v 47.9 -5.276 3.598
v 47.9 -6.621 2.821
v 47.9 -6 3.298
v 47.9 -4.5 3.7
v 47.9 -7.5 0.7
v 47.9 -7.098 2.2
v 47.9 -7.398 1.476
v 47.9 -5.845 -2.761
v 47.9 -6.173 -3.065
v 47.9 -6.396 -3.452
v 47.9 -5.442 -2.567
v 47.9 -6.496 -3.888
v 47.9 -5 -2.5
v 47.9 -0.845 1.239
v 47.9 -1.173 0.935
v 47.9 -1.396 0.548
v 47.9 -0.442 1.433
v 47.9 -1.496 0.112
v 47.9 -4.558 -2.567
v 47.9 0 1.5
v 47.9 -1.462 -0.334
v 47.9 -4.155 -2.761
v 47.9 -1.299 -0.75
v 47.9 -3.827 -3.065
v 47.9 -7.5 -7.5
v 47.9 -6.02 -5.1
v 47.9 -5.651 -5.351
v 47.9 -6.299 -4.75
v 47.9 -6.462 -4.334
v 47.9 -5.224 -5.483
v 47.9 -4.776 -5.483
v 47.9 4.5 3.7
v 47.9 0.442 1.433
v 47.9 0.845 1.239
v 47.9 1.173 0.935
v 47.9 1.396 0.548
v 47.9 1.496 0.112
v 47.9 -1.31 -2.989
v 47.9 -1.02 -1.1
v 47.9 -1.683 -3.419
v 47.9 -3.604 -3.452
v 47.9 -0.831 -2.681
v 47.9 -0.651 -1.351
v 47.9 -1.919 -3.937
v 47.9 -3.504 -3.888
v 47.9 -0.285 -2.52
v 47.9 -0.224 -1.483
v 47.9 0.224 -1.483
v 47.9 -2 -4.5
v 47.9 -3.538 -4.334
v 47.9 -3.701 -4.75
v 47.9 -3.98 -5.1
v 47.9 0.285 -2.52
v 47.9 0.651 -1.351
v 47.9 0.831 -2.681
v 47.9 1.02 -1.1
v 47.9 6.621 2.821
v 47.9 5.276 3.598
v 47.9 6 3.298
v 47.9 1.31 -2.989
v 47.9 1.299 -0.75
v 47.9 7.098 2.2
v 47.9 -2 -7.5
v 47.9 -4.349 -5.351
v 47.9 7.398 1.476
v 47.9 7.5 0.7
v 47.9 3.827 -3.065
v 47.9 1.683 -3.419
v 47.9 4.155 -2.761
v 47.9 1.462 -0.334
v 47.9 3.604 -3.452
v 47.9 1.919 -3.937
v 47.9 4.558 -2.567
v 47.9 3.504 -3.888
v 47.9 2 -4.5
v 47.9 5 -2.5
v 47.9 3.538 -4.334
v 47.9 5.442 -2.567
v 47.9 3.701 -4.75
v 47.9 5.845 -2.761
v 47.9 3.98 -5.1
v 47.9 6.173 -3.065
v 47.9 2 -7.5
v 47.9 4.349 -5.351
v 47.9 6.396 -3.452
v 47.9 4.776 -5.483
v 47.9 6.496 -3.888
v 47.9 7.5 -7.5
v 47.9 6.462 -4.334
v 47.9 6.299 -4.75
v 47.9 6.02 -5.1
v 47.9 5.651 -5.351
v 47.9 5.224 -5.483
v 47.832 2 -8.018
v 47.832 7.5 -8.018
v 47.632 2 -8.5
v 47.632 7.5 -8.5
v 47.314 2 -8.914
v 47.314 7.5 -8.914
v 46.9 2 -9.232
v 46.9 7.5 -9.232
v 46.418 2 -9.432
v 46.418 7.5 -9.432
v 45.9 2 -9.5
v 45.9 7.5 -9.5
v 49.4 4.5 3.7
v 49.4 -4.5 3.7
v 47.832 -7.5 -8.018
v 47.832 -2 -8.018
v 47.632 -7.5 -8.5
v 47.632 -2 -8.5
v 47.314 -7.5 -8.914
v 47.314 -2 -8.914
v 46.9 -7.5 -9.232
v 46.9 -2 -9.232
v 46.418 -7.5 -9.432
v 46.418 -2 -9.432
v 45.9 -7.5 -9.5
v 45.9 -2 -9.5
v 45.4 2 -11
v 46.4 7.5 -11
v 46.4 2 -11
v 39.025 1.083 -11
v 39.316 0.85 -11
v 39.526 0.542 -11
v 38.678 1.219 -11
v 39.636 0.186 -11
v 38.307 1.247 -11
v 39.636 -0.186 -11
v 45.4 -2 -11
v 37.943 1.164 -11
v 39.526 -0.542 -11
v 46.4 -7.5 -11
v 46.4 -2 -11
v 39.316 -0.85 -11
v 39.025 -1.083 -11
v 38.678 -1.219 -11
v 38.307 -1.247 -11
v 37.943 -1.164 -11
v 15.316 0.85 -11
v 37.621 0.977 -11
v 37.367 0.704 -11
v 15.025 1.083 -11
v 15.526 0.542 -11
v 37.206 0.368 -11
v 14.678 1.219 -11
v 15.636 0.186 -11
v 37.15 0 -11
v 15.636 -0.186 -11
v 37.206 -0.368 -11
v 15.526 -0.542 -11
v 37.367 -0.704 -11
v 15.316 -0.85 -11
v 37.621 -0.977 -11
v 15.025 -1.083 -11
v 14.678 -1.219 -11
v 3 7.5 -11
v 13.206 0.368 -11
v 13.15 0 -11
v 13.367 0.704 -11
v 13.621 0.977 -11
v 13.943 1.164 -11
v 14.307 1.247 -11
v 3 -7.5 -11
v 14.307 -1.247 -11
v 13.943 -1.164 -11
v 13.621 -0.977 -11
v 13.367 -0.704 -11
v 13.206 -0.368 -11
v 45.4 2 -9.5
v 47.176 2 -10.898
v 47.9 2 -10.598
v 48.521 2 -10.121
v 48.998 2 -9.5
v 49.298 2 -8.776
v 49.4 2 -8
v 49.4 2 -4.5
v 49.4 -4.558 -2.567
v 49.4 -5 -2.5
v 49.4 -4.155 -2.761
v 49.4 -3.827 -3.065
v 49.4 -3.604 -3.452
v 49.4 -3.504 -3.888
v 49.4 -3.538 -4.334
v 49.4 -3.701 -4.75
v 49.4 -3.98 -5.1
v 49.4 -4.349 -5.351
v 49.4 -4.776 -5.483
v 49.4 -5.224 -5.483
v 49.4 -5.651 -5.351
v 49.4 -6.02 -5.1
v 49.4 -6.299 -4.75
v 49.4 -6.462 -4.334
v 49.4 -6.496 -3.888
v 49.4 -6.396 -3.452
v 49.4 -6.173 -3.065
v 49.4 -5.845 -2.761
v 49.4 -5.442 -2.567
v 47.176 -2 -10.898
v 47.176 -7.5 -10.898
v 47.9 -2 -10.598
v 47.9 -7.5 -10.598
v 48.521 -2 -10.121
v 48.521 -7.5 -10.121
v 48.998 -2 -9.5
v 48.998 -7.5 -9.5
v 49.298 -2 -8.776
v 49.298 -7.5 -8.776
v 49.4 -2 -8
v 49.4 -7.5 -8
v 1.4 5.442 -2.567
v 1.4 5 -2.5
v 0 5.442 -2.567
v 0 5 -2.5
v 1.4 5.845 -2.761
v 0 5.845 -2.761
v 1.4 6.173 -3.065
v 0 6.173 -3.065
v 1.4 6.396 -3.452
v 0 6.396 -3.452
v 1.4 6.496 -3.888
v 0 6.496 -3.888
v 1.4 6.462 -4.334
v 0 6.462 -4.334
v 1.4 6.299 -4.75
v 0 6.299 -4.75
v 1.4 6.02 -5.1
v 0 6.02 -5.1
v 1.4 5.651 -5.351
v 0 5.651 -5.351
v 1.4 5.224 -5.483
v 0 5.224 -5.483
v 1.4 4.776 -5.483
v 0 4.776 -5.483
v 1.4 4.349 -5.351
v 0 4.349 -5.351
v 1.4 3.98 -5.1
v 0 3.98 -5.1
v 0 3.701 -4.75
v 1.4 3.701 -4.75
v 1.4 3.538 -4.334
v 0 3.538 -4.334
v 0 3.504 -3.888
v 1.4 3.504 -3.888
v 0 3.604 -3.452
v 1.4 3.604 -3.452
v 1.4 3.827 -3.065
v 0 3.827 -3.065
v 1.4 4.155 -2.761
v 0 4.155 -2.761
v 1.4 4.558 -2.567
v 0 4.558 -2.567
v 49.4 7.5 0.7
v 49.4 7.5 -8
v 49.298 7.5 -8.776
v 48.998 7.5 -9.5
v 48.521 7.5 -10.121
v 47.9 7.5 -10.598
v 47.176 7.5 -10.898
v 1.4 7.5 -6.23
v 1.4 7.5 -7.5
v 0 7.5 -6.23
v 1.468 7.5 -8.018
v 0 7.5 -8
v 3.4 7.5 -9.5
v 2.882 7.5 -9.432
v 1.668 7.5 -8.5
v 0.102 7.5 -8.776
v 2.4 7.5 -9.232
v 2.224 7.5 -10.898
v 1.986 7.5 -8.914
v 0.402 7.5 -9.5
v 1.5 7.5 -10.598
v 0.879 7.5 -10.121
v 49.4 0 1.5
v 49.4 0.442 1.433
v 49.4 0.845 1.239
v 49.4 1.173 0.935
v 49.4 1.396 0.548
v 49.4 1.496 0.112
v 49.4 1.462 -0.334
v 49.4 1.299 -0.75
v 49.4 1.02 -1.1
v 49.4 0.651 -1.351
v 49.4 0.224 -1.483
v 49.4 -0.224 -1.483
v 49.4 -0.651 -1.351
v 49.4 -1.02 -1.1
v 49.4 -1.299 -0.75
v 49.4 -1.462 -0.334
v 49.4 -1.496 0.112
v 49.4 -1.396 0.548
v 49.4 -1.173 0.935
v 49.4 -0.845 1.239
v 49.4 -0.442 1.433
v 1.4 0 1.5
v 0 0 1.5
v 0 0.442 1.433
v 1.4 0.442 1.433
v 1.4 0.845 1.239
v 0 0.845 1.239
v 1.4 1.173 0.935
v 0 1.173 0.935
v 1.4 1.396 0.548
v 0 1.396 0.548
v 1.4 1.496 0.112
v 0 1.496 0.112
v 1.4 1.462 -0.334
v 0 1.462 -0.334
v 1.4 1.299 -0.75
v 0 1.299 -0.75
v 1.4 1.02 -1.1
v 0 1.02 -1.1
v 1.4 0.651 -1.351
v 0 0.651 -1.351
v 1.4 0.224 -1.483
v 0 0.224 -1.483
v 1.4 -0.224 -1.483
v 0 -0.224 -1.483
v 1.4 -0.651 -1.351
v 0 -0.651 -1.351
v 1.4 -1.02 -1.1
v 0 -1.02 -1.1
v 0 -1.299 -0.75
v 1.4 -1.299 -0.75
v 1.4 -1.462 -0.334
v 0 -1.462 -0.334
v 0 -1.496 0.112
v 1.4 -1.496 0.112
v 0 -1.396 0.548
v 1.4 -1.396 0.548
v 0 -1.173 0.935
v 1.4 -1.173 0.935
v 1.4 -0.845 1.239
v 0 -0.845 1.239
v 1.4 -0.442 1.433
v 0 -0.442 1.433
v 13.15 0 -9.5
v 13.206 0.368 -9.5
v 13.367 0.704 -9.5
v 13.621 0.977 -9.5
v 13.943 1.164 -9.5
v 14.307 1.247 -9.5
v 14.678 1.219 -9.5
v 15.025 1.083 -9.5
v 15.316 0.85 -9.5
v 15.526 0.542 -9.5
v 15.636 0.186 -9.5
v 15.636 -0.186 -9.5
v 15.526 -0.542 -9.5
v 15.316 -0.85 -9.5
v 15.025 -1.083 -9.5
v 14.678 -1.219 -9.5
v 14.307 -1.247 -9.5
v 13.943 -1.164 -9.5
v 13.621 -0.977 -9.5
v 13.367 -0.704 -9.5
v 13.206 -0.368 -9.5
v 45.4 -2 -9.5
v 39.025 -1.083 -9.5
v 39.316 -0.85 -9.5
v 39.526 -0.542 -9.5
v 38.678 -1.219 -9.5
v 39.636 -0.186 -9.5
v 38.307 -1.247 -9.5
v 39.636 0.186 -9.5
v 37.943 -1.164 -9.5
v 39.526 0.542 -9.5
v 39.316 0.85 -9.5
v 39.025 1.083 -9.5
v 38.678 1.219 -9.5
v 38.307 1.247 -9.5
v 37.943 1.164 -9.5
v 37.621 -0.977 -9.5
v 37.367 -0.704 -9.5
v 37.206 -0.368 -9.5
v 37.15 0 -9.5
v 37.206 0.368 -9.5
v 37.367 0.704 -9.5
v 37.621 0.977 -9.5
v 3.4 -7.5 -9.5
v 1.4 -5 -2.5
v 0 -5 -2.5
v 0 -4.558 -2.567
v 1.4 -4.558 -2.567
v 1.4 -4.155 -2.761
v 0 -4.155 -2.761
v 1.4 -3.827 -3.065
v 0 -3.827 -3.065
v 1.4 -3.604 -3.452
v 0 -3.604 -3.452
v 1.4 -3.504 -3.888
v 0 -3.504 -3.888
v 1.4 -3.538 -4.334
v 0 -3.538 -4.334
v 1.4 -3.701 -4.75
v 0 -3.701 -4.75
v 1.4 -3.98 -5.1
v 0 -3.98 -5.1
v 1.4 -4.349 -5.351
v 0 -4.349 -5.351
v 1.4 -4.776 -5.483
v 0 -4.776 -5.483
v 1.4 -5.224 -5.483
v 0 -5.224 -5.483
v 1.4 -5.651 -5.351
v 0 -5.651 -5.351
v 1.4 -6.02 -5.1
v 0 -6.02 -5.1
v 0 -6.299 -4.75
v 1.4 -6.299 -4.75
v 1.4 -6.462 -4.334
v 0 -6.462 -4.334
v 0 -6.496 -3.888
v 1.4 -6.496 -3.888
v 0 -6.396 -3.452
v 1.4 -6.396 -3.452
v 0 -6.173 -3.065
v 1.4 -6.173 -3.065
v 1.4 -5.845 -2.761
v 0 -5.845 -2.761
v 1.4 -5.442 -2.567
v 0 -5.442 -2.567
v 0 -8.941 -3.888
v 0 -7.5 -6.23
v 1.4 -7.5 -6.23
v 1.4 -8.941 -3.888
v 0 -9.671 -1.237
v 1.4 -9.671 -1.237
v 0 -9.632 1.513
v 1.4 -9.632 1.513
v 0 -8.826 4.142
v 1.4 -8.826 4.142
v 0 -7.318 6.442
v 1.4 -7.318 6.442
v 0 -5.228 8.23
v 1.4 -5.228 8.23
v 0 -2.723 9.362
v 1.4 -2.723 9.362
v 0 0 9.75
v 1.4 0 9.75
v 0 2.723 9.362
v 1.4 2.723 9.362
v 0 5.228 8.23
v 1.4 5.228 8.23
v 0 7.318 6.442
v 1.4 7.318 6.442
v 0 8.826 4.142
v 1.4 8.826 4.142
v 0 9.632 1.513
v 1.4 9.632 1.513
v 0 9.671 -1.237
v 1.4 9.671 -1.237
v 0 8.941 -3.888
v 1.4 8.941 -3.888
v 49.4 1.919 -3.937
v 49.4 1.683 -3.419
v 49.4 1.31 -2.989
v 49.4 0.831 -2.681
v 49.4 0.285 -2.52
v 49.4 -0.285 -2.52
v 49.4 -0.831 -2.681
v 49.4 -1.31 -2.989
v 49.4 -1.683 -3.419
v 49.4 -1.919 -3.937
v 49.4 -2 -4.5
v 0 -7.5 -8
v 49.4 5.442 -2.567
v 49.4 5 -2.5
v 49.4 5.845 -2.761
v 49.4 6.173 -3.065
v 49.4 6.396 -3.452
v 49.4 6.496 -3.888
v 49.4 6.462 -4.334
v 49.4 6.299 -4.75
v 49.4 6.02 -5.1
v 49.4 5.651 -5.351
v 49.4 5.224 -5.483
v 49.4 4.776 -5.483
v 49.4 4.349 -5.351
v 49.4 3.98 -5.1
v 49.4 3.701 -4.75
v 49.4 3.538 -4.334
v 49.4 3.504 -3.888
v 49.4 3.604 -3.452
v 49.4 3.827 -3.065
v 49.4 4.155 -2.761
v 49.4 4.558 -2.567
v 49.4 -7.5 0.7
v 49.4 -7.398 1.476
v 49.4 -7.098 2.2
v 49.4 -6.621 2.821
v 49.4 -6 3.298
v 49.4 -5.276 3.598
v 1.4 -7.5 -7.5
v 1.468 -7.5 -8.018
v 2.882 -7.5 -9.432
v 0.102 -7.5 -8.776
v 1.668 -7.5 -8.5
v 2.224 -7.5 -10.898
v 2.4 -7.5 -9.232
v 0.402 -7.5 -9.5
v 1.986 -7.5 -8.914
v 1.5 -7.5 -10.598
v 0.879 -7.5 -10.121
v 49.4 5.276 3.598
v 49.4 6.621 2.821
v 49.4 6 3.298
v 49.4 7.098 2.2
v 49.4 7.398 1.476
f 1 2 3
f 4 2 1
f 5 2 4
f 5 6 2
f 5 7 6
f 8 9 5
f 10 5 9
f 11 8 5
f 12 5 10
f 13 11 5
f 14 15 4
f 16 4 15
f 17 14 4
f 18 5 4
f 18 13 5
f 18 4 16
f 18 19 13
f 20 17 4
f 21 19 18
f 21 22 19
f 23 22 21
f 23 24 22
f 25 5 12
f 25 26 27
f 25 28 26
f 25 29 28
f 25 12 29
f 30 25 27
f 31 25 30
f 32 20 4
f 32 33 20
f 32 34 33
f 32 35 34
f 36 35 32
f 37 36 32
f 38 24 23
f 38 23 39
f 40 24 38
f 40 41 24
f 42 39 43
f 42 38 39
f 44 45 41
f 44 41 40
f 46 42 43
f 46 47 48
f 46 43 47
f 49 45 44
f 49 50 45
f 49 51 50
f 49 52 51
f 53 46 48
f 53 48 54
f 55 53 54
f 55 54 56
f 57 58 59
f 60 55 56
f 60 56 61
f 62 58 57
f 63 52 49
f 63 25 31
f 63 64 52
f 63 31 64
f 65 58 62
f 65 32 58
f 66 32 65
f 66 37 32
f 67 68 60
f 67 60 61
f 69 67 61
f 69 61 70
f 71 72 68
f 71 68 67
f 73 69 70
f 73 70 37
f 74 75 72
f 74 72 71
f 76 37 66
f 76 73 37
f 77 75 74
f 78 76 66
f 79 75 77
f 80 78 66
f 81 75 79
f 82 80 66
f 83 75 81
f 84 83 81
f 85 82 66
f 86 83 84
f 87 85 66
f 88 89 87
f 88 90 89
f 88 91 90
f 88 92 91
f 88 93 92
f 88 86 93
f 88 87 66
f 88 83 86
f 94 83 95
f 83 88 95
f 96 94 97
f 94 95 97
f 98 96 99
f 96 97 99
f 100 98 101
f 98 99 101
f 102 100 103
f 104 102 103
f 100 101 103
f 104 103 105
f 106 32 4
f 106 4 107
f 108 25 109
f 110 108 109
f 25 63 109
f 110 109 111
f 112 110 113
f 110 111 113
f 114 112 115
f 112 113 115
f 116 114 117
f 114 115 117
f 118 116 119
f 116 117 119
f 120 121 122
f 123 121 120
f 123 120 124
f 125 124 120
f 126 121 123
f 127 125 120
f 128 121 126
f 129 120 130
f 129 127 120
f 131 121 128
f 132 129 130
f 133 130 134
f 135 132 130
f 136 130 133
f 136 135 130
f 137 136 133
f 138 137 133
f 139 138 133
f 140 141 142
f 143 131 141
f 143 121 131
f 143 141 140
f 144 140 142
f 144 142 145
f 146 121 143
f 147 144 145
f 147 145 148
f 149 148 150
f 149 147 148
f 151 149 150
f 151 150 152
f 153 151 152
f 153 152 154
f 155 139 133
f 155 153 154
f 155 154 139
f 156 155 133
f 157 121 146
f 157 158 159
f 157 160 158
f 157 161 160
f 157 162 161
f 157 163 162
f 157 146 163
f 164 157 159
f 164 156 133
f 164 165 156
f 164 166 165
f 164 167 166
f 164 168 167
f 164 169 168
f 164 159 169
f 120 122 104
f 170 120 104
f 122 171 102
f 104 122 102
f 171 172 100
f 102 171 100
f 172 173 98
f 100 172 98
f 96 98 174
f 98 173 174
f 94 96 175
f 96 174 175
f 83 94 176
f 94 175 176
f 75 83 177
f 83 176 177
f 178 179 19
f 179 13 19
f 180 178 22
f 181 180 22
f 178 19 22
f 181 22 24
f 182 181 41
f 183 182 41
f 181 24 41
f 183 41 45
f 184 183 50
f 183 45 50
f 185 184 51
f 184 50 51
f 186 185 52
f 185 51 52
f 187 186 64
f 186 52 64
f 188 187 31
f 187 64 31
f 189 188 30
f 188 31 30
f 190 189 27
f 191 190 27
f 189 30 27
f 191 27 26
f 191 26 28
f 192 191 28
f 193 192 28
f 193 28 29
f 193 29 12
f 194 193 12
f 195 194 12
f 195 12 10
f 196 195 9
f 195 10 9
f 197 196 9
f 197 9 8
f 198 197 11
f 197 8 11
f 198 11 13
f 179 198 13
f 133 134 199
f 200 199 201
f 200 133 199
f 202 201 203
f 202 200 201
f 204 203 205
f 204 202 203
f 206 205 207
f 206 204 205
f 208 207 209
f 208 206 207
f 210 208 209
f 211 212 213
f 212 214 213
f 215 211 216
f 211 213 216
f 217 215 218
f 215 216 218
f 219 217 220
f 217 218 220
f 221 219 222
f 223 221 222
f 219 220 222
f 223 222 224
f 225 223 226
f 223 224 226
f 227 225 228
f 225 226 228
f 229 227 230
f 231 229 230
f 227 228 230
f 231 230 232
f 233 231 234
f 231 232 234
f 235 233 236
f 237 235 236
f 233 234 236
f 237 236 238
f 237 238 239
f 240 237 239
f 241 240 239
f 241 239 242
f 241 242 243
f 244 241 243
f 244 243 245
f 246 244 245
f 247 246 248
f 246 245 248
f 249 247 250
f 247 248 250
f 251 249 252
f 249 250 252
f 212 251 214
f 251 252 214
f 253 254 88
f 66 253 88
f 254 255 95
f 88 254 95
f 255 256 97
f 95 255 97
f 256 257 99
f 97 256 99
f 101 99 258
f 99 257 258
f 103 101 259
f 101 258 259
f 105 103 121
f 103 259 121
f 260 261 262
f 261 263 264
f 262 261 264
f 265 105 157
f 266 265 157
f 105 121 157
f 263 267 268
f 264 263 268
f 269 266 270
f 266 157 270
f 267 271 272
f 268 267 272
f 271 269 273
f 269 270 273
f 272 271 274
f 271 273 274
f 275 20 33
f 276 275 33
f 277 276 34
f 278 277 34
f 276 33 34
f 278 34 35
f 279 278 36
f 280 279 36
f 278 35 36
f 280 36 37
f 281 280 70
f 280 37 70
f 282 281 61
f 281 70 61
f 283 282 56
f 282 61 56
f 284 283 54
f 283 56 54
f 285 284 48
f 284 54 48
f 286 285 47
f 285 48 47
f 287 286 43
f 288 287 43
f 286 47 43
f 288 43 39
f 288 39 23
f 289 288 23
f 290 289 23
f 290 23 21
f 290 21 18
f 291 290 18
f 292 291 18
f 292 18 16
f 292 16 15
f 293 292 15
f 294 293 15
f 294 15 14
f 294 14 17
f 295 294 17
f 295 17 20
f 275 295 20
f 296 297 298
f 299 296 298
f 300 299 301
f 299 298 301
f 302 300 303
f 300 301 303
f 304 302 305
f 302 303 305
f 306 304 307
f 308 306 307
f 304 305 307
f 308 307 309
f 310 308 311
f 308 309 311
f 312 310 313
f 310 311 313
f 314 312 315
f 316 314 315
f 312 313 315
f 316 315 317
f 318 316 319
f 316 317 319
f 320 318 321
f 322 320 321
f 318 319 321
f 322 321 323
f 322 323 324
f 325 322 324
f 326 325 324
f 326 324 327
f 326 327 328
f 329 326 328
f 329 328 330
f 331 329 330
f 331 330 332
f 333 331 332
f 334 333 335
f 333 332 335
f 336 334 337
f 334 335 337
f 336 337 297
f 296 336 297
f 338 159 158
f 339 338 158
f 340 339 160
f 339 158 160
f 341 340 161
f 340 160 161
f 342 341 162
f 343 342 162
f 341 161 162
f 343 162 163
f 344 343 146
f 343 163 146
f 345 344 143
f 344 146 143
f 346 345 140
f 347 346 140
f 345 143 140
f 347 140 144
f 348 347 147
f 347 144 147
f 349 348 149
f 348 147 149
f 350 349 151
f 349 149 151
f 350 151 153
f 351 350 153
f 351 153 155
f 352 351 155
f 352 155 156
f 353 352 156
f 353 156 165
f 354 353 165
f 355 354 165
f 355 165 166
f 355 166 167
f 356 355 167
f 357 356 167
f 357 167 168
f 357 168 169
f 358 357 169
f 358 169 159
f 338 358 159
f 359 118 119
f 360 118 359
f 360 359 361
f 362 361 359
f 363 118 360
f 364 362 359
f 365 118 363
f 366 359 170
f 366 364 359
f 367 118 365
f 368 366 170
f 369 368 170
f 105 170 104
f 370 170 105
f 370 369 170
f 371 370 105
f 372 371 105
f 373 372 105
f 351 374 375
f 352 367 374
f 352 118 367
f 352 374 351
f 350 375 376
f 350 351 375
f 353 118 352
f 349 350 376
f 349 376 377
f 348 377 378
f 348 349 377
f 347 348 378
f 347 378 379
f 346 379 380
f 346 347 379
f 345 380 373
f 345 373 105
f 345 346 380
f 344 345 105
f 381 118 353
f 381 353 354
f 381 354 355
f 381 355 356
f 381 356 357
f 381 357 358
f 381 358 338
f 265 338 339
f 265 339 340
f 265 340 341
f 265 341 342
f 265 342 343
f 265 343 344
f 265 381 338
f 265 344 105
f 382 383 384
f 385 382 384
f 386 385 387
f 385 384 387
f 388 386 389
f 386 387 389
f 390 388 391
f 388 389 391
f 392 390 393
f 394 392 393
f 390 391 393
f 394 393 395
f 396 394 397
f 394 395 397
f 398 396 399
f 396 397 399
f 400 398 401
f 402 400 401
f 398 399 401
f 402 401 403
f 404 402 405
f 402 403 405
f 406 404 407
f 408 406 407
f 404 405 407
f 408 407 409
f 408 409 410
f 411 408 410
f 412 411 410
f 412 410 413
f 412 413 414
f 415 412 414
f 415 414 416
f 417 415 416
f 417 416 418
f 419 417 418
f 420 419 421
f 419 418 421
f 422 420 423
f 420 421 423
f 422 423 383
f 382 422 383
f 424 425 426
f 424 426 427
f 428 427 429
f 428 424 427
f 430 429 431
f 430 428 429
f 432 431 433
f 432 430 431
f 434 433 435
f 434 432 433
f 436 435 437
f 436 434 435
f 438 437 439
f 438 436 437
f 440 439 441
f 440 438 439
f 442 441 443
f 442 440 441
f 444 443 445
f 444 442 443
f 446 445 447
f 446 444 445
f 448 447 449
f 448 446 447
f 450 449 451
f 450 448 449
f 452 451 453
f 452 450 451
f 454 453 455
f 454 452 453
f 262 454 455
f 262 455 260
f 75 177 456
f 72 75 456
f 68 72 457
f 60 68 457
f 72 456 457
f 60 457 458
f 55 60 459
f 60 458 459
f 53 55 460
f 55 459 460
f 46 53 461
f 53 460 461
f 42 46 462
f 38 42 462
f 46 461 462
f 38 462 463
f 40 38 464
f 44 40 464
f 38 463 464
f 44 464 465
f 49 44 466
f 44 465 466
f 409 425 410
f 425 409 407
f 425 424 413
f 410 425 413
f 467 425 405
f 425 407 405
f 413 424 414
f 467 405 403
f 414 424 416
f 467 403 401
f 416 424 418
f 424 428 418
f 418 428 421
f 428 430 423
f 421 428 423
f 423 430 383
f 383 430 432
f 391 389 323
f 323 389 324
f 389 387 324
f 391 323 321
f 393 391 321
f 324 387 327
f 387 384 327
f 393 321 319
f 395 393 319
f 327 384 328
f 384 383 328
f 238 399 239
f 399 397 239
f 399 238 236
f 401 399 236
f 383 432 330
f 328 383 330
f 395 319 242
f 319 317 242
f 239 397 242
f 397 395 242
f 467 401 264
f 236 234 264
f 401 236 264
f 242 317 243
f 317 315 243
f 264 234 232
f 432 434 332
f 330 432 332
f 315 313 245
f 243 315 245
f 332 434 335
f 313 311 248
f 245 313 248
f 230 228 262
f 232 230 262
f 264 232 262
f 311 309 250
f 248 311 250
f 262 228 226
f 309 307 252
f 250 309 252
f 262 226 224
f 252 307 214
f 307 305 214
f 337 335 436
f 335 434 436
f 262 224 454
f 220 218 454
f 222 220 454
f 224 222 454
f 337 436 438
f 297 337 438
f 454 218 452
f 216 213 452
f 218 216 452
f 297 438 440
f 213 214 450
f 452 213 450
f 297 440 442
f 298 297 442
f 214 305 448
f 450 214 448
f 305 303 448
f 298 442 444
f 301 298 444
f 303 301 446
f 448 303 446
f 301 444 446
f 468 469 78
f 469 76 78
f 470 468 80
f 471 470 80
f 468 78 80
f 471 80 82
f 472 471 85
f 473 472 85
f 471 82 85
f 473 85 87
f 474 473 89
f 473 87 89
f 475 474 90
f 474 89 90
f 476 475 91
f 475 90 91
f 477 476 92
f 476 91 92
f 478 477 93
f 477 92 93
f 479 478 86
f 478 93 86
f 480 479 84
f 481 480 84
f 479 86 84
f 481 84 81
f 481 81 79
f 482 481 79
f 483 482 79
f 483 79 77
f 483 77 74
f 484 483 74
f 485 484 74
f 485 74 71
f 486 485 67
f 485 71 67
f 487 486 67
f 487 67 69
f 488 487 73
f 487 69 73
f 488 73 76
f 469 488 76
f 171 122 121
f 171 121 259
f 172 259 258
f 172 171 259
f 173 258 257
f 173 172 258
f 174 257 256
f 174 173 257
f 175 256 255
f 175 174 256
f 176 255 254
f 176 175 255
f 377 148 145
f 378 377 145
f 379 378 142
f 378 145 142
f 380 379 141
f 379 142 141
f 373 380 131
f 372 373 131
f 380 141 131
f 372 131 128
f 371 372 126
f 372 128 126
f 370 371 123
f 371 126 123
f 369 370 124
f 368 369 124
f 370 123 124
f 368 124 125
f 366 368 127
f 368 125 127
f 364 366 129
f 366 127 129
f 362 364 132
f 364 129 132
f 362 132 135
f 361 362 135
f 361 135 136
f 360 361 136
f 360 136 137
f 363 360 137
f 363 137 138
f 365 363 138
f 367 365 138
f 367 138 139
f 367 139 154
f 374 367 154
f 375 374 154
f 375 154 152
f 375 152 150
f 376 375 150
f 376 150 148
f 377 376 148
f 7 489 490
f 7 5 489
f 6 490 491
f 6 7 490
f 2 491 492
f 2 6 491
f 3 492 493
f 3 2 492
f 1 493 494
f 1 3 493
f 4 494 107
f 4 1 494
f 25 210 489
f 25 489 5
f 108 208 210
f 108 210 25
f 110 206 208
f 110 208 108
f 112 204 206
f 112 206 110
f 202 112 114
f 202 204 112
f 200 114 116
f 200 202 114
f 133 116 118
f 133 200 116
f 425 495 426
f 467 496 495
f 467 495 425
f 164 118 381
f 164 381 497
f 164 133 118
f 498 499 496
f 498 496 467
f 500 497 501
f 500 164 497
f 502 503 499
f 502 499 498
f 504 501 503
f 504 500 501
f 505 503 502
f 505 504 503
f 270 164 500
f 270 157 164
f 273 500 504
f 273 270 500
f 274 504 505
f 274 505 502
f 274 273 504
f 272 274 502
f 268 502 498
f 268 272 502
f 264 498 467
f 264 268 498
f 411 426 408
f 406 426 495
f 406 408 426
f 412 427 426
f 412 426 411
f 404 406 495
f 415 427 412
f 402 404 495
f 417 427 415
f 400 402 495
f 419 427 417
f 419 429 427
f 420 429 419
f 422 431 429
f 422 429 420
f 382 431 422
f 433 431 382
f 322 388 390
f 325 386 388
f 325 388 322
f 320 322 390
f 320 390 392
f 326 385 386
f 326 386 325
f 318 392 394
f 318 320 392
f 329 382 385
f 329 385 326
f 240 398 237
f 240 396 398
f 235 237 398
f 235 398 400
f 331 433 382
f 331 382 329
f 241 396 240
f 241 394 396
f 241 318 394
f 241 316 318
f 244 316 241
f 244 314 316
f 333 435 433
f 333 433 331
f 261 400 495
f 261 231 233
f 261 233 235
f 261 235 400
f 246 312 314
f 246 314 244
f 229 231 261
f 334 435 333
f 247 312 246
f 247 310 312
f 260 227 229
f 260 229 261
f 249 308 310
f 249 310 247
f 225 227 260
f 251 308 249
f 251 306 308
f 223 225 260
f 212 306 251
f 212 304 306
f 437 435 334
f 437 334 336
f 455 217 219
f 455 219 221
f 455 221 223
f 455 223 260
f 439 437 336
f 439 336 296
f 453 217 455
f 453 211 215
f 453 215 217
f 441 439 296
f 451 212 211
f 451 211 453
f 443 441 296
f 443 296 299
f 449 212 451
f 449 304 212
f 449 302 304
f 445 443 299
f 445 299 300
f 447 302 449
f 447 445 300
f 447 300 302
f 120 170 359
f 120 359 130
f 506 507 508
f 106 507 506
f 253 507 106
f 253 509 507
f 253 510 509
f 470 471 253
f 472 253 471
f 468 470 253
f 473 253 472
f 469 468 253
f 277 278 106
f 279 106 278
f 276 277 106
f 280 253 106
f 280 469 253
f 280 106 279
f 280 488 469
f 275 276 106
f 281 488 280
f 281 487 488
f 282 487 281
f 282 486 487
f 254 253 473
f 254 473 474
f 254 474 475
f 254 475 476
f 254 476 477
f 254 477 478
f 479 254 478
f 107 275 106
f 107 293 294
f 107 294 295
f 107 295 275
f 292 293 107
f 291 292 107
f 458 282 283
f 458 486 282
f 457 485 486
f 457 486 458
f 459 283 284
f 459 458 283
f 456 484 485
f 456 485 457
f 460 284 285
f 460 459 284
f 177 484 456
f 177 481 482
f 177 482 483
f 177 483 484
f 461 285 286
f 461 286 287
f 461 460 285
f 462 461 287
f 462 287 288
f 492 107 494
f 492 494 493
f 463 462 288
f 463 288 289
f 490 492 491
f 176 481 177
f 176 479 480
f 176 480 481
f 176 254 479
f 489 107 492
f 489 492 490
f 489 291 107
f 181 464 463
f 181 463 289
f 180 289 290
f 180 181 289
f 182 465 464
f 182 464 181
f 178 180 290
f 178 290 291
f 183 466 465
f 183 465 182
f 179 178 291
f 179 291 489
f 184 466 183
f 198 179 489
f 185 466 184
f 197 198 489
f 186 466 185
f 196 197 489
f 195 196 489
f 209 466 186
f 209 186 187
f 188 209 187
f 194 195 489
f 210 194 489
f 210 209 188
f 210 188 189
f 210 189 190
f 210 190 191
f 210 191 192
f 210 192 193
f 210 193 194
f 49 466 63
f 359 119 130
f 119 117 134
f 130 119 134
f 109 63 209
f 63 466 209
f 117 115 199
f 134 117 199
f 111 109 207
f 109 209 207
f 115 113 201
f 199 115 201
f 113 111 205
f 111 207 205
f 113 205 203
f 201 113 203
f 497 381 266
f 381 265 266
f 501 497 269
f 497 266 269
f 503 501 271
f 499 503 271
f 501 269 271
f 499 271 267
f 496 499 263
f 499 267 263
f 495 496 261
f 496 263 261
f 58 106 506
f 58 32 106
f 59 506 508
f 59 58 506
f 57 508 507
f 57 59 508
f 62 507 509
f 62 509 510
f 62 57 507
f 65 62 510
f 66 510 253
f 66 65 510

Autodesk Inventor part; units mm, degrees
ref_plane "YZ Plane" through (0, 0, 0) normal (1, 0, 0) x (0, 1, 0)
ref_plane "XZ Plane" through (0, 0, 0) normal (0, 1, 0) x (-1, 0, 0)
ref_plane "XY Plane" through (0, 0, 0) normal (0, 0, 1) x (1, 0, 0)
sketch "スケッチ1" plane through (0, 0, 0) normal (1, 0, 0) x (0, 1, 0)
  circle A0 centre (0, 0) radius 9.75
  dimension "d0" = 19.5
extrude "押し出し1" add sketch "スケッチ1" along normal blind 1.4
sketch "スケッチ2" plane through (1.4, 0, 0) normal (1, 0, 0) x (0, 0, -1)
  circle A0 centre (0, 0) radius 9.75 projected
  line L0 (0, 0) -> (0, -7.5)
  line L1 (0, -7.5) -> (11, -7.5)
  line L2 (11, -7.5) -> (11, 7.5)
  line L3 (11, 7.5) -> (0, 7.5)
  line L4 (0, 7.5) -> (0, 0)
  point P0 (6.23, 7.5)
  point P1 (6.23, -7.5)
  dimension "d3" = 7.5
  dimension "d4" = 11
  dimension "d5" = 15
extrude "押し出し2" add sketch "スケッチ2" against normal blind 1.4 contours A0 L3 L2 L1
sketch "スケッチ4" plane through (1.4, 0, 0) normal (1, 0, 0) x (0, 0, -1)
  line L0 (11, -7.5) -> (6.23, -7.5) projected
  line L1 (6.23, 7.5) -> (11, 7.5) projected
  line L2 (11, -7.5) -> (9.5, -7.5)
  line L3 (9.5, -7.5) -> (9.5, 7.5)
  line L4 (9.5, 7.5) -> (11, 7.5)
  line L5 (11, 7.5) -> (11, -7.5)
  point P0 (0, 0)
  dimension "d13" = 1.5
extrude "押し出し4" add sketch "スケッチ4" along normal blind 48
sketch "スケッチ5" plane through (1.4, -7.5, -9.5) normal (0, 0, 1) x (1, 0, 0)
  line L0 (48, 15) -> (48, 0) projected
  line L1 (48, 15) -> (-1.4, 15) projected
  line L2 (48, 0) -> (46.5, 0)
  line L3 (46.5, 0) -> (46.5, 15)
  line L4 (46.5, 15) -> (48, 15)
  line L5 (48, 15) -> (48, 0)
  point P0 (-1.4, 7.5)
  dimension "d16" = 1.5
extrude "押し出し5" add sketch "スケッチ5" along normal blind 13.2
sketch "スケッチ6" plane through (0, 0, 0) normal (-1, 0, 0) x (0, 0, 1)
  circle A0 centre (0, 0) radius 1.5
  circle A1 centre (-4, 5) radius 1.5
  circle A2 centre (-4, -5) radius 1.5
  dimension "d19" = 3
  dimension "d20" = 3
  dimension "d21" = 3
extrude "押し出し6" cut sketch "スケッチ6" against normal blind 50
fillet "フィレット1" radius 3 2 edges at (48.65, 7.5, 3.7) (48.65, -7.5, 3.7)
fillet "フィレット2" radius 3 2 edges at (49.4, 0, -11) (0, 0, -11)
fillet "フィレット3" radius 2 2 edges at (1.4, 0, -9.5) (47.9, 0, -9.5)
sketch "スケッチ7" plane through (46.4, 7.5, -11) normal (0, 0, -1) x (-1, 0, 0)
  circle A0 centre (8, -7.5) radius 1.25
  circle A1 centre (32, -7.5) radius 1.25
  point P0 (46.4, -7.5)
  dimension "d27" = 2.5
  dimension "d28" = 2.5
extrude "押し出し7" cut sketch "スケッチ7" against normal blind 13.2
sketch "スケッチ8" plane through (49.4, 0, 0) normal (1, 0, 0) x (0, 0, -1)
  line L0 (11, 1.25) -> (11, -1.25) projected
  line L1 (11, 0) -> (11, 2)
  line L2 (11, 7.5) -> (11, -7.5) projected
  line L3 (11, 2) -> (4.5, 2)
  line L4 (4.5, 2) -> (4.5, -2)
  line L5 (4.5, -2) -> (11, -2)
  line L6 (11, -2) -> (11, 0)
  point P0 (0, 0)
  dimension "d31" = 2
  dimension "d32" = 6.5
  dimension "d33" = 4
extrude "押し出し8" cut sketch "スケッチ8" against normal blind 4
sketch "スケッチ9" plane through (49.4, 0, 0) normal (1, 0, 0) x (0, 0, -1)
  line L0 (4.5, 2) -> (4.5, -2) projected
  circle A0 centre (4.5, 0) radius 2
  point P0 (0, 0)
extrude "押し出し9" cut sketch "スケッチ9" against normal blind 4 contours L0 A0 picked at (3.8804, 0.6667)
thread "ねじ1" size "M2.5x0.45" class "6H" standard "ANSI Metric M Profile" full length
thread "ねじ2" size "M2.5x0.45" class "6H" standard "ANSI Metric M Profile" full length
properties material "アルミニウム"
